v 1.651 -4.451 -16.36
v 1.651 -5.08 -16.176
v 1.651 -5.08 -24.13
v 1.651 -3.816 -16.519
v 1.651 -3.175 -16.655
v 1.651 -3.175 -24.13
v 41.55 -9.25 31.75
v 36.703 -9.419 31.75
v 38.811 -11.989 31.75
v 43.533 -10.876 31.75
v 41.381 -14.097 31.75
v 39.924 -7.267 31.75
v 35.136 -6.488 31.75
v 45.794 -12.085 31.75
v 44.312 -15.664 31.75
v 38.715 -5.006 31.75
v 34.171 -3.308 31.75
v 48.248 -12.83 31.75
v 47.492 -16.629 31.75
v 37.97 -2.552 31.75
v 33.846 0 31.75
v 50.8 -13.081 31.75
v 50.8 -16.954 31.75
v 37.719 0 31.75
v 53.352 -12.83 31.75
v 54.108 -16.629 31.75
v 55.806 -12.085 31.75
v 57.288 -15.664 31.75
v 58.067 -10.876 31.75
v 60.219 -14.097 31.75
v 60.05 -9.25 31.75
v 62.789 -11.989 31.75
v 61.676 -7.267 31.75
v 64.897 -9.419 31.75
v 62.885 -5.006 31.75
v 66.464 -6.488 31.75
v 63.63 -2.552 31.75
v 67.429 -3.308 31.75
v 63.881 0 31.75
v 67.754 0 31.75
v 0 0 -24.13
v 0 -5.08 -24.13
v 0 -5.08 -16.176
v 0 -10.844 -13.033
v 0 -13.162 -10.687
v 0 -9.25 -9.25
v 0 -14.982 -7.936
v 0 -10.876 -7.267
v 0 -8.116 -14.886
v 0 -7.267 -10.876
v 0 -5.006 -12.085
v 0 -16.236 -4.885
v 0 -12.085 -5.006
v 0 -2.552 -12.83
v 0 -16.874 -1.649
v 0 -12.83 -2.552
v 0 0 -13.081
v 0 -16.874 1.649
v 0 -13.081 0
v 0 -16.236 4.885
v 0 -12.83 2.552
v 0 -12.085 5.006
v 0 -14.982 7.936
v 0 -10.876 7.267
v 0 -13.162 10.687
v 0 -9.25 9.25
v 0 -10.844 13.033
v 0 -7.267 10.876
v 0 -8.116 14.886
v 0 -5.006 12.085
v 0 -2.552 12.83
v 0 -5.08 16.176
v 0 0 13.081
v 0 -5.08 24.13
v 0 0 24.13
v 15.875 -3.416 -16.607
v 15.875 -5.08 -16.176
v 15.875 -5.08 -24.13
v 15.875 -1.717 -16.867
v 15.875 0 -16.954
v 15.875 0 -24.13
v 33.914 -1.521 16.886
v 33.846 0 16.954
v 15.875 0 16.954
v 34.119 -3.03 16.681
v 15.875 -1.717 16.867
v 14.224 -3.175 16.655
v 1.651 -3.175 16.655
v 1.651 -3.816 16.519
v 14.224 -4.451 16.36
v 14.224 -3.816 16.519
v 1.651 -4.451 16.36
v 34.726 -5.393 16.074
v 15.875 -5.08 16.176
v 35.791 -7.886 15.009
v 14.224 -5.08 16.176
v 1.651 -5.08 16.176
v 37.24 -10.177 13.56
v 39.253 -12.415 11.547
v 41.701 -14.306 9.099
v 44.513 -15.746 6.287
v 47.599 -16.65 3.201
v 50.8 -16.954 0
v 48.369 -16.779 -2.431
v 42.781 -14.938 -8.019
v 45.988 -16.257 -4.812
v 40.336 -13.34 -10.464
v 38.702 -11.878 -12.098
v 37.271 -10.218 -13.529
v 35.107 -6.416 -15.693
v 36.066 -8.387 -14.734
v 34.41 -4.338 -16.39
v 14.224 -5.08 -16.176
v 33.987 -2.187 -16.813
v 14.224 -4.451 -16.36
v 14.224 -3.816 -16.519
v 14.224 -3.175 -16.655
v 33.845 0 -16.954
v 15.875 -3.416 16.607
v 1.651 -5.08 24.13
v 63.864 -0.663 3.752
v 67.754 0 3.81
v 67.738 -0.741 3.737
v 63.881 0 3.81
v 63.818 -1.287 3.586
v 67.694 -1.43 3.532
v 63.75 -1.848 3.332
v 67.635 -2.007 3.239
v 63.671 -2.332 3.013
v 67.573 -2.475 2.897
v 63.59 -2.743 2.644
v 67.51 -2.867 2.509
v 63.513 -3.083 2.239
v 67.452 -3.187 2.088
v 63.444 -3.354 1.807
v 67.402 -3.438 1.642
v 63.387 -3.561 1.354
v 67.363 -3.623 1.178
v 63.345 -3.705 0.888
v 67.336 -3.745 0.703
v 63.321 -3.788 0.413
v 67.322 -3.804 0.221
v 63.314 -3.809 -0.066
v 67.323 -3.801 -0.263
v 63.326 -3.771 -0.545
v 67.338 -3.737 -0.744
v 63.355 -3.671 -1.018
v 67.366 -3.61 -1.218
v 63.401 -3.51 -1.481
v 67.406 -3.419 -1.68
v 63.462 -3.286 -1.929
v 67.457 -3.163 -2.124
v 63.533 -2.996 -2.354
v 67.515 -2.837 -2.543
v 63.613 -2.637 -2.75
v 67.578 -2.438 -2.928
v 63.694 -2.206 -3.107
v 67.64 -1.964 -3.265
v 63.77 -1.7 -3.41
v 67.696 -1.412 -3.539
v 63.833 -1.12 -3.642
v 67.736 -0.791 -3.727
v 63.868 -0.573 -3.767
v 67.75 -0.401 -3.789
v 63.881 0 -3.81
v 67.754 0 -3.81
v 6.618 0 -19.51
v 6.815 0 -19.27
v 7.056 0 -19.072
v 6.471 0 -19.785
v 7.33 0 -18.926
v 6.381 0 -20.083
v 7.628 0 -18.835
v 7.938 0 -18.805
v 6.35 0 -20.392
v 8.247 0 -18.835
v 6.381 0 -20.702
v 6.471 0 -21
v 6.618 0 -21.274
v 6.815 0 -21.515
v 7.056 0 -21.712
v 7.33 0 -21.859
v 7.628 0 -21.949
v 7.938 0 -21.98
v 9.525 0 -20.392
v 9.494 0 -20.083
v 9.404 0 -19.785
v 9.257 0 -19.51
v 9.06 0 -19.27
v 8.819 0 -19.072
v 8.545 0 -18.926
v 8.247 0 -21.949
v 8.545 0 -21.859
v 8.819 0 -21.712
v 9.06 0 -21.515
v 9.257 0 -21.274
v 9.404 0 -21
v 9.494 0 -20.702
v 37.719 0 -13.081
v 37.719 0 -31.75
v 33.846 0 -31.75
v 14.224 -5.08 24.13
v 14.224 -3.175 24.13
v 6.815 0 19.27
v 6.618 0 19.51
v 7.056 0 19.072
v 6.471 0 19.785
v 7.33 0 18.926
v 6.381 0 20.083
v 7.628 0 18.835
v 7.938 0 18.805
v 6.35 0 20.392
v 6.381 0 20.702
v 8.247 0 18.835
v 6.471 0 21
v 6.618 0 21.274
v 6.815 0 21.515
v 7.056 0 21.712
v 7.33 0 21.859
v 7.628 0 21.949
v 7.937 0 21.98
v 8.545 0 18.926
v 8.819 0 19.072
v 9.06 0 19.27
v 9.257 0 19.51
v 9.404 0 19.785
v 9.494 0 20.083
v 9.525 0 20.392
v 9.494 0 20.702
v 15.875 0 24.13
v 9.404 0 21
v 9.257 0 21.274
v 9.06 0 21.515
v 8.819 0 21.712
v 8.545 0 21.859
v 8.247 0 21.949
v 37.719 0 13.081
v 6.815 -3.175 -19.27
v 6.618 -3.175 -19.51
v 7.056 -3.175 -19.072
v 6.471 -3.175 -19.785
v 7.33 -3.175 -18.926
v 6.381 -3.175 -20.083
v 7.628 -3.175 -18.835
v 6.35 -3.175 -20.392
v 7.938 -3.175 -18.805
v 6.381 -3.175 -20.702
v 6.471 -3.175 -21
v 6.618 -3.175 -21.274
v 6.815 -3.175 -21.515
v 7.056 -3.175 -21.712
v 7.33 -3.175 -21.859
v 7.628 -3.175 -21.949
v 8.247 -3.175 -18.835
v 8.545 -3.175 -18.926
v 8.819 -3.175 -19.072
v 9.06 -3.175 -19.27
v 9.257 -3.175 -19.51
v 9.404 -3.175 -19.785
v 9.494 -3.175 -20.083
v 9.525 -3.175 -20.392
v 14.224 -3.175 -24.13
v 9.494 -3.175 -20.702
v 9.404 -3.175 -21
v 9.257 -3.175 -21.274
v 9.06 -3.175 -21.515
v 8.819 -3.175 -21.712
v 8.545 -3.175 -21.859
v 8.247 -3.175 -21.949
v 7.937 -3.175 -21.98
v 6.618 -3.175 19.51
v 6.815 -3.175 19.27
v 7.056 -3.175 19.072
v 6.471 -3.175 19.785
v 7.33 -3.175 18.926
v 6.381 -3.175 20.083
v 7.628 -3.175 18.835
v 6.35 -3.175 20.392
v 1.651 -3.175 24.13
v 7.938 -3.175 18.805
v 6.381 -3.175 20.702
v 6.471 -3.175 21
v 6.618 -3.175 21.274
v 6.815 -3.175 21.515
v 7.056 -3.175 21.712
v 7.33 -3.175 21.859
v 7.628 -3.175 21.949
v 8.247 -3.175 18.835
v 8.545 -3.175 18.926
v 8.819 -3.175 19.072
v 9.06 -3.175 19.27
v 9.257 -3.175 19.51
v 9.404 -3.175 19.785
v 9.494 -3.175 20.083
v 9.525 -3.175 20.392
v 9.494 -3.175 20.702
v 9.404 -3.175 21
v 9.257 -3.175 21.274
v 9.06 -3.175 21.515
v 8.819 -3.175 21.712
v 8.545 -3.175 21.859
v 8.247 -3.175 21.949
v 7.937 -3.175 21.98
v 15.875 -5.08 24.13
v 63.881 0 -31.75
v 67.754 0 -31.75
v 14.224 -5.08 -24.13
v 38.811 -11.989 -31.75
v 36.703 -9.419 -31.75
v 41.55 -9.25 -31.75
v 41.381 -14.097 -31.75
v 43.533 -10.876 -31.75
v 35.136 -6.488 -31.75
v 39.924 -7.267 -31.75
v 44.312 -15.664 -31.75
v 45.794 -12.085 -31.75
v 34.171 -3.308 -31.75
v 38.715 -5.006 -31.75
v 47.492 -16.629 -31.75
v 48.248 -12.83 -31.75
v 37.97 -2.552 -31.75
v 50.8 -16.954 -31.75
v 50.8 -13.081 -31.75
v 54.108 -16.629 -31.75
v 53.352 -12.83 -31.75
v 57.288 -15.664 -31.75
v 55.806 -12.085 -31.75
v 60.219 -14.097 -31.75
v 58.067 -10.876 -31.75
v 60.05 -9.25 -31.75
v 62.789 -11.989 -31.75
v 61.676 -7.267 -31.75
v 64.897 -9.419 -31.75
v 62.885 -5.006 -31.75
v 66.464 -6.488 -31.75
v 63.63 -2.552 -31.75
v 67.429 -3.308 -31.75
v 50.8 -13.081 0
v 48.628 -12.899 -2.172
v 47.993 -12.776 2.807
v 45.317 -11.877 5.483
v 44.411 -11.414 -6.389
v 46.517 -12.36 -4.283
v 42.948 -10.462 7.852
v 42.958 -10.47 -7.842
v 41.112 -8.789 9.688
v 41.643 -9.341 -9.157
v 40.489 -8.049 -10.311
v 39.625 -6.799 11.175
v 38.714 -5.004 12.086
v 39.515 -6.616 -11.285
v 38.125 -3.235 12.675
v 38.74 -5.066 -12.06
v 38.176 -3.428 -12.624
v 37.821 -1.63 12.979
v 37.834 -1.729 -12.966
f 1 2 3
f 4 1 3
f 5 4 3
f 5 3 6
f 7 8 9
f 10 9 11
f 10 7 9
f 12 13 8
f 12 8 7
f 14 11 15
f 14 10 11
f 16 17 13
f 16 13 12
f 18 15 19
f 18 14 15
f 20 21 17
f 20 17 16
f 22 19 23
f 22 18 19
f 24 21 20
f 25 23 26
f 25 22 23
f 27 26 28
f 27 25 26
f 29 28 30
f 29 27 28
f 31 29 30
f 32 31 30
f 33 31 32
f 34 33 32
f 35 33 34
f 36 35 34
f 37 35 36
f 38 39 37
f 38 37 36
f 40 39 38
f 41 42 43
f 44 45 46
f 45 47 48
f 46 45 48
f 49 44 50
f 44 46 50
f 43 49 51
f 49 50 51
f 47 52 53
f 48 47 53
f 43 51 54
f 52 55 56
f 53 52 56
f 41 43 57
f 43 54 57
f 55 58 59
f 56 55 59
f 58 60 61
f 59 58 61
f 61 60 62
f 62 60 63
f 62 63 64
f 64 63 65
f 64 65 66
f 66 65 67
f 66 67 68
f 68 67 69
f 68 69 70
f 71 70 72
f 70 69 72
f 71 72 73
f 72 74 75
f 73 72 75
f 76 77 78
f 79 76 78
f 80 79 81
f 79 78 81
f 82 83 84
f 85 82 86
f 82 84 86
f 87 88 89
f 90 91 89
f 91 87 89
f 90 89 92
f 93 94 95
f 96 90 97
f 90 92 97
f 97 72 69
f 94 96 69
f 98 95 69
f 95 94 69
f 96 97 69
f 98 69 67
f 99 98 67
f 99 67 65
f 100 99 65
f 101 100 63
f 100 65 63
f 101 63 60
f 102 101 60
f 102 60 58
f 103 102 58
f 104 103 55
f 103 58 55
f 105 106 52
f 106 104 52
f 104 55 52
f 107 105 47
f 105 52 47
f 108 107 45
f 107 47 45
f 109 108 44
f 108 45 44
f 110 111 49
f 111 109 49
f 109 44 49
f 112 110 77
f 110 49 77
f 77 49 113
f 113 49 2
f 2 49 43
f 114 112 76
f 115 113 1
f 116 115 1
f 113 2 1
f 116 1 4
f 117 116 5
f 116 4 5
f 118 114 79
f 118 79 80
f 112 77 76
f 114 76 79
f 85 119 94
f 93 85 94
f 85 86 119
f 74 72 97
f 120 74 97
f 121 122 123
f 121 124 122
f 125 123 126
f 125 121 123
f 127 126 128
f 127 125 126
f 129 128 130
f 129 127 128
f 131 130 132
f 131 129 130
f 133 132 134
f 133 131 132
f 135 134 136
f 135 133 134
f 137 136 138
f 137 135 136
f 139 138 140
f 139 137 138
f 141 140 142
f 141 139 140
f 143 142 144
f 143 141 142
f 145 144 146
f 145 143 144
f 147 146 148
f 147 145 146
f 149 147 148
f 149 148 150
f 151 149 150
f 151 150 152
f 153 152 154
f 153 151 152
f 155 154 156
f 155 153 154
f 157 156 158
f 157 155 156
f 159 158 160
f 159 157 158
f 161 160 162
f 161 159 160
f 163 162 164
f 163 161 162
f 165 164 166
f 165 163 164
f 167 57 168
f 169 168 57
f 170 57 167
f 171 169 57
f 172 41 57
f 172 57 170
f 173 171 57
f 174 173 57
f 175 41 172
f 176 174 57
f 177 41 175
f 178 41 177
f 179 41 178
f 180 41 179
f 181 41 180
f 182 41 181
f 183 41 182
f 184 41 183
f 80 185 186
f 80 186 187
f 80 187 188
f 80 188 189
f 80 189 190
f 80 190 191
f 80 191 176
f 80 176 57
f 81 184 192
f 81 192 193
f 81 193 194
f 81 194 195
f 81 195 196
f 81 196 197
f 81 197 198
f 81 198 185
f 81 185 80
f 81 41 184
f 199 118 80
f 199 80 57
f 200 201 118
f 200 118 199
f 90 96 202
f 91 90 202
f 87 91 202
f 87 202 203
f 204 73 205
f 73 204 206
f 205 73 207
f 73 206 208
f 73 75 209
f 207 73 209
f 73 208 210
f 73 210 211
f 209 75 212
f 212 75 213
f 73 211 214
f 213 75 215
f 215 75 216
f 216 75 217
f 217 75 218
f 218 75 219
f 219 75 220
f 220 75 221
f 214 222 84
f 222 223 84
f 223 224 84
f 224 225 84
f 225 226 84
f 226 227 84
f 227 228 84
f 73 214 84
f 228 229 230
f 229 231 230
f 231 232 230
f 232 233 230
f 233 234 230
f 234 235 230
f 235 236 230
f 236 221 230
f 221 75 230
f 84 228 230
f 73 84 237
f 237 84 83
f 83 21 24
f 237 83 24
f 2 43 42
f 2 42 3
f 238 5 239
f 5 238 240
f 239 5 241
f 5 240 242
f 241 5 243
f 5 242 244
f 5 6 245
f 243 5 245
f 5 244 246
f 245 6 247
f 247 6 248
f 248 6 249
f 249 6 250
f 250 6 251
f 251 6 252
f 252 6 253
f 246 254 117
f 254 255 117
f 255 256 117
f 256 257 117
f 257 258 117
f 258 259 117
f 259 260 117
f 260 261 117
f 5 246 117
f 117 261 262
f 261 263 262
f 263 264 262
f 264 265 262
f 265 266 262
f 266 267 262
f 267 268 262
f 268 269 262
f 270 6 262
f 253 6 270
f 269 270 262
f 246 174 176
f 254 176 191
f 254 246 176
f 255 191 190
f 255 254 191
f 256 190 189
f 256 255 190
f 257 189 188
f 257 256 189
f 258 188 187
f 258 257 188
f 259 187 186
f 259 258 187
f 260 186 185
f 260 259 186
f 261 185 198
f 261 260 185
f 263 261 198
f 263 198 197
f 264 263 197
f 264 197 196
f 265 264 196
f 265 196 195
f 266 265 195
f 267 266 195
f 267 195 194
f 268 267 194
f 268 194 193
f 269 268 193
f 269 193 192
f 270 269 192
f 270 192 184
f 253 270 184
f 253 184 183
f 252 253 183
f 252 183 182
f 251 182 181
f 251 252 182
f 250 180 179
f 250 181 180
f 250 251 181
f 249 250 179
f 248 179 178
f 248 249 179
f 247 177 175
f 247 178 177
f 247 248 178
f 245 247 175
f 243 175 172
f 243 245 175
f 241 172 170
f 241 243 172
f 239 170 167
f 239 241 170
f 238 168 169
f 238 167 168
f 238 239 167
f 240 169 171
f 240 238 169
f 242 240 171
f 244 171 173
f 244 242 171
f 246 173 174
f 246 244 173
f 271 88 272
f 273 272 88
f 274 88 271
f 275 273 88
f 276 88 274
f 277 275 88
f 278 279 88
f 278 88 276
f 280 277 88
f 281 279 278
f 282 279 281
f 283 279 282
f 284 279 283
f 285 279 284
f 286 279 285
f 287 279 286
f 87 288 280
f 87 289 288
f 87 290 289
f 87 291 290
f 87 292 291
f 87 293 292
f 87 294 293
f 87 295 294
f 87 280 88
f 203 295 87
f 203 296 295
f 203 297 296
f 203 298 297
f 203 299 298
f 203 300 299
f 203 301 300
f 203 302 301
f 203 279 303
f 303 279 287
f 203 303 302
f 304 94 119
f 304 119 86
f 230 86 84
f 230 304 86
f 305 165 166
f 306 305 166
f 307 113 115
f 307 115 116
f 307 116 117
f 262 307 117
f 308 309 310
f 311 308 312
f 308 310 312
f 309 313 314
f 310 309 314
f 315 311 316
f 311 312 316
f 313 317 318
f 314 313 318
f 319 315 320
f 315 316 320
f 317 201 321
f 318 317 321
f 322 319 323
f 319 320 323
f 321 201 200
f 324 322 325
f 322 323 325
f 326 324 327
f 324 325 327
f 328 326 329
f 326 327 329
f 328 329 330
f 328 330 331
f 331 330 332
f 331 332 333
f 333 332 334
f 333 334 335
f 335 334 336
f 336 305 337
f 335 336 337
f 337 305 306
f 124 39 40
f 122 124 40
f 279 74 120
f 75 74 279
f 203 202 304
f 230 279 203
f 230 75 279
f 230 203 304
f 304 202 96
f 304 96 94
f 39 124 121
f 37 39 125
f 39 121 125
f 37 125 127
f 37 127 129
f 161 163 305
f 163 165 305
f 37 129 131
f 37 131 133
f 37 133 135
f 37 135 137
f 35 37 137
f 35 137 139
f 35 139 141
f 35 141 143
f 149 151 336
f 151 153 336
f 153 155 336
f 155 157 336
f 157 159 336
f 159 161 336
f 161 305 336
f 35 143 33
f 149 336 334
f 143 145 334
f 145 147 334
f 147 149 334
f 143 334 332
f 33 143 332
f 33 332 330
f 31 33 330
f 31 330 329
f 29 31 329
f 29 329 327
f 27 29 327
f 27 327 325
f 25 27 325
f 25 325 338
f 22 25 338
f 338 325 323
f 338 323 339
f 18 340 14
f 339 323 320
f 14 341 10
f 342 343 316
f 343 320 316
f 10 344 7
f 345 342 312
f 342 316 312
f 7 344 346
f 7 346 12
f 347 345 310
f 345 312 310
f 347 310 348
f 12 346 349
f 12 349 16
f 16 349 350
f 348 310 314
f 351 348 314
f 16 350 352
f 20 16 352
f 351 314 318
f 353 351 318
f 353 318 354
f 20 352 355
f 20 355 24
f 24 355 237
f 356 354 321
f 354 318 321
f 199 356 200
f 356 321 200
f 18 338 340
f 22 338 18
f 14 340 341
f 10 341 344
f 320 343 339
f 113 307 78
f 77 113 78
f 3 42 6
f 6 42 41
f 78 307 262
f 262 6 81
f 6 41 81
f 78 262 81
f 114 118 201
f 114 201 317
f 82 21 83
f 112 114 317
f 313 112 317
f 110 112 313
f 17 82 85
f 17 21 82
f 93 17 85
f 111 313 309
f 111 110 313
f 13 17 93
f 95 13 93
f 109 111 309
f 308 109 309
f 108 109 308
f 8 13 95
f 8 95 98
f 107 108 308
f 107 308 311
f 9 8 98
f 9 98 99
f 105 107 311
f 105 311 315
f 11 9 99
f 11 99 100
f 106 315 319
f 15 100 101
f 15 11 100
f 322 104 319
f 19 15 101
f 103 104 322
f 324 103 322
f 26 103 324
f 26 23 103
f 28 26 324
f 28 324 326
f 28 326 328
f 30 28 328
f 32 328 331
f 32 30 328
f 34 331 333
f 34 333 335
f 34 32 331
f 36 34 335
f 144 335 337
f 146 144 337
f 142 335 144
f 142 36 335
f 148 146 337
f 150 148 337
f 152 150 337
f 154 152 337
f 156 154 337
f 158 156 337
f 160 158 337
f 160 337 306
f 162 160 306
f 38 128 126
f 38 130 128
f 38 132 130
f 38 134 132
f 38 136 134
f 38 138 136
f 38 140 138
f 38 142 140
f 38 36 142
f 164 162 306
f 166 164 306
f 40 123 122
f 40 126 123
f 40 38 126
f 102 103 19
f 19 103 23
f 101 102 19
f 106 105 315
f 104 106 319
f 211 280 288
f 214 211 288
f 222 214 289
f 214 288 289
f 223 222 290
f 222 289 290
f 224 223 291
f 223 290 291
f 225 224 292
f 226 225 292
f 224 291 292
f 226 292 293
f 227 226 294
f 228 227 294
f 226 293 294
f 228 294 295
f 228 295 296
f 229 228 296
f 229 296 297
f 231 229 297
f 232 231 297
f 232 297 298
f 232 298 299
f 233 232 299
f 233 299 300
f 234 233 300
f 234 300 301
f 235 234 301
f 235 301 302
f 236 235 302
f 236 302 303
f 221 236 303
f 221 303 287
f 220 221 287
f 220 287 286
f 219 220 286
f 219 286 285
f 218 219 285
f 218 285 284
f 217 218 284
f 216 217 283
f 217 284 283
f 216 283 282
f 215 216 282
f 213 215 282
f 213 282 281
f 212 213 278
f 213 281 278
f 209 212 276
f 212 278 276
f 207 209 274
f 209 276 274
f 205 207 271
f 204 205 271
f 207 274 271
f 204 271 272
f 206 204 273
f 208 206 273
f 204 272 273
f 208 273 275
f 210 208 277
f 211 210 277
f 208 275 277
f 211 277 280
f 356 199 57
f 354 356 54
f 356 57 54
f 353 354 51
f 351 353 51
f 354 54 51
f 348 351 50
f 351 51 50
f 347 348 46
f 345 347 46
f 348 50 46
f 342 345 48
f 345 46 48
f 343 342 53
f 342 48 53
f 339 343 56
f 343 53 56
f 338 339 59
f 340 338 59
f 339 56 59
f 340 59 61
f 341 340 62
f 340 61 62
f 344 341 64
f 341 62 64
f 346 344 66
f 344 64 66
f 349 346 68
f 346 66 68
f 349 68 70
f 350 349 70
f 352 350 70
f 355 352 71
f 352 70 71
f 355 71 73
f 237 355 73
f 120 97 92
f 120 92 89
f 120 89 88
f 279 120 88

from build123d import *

# Parameters (mm, degrees)
SKETCH1_R                = 16.9545
BOSS_EXTRUDE1_DEPTH      = 50.8
SKETCH2_R                = 16.9545
BOSS_EXTRUDE2_DEPTH      = 31.75
SKETCH3_R                = 13.081
CUT_EXTRUDE1_DEPTH       = 50.8
SKETCH5_R                = 13.081
CUT_EXTRUDE2_DEPTH       = 63.5
CUT_EXTRUDE4_DEPTH       = 77.72150833
CUT_EXTRUDE4_DEPTH_BACK  = 77.72150833
SKETCH6_R                = 3.81
BOSS_EXTRUDE3_REACH      = 91.447
BOSS_EXTRUDE3_END_RADIUS = 16.9545
SKETCH8_W                = 15.875
SKETCH8_H                = 5.08
CUT_EXTRUDE5_REACH       = 91.447
CUT_EXTRUDE5_END_RADIUS  = 16.9545
SKETCH9_W                = 12.573
SKETCH9_H                = 1.905
SKETCH10_R               = 1.5875
CUT_EXTRUDE6_DEPTH       = 77.08291144


with BuildPart() as part:
    # Sketch1 → Boss-Extrude1 (new body)
    with BuildSketch(Plane(origin=(0, 0, 0), x_dir=(0, 0, -1), z_dir=(1, 0, 0))):
        Circle(SKETCH1_R)
    extrude(amount=BOSS_EXTRUDE1_DEPTH)

    # Sketch2 → Boss-Extrude2 (add, symmetric)
    with BuildSketch(Plane.XY):
        with Locations((50.8, 0)):
            Circle(SKETCH2_R)
    extrude(amount=BOSS_EXTRUDE2_DEPTH, both=True)

    # Sketch3 → Cut-Extrude1 (cut)
    with BuildSketch(Plane.ZY):
        Circle(SKETCH3_R)
    extrude(amount=-CUT_EXTRUDE1_DEPTH, mode=Mode.SUBTRACT)

    # Sketch5 → Cut-Extrude2 (cut)
    with BuildSketch(Plane(origin=(0, 0, -31.75), x_dir=(-1, 0, 0), z_dir=(0, 0, -1))):
        with Locations((-50.8, 0)):
            Circle(SKETCH5_R)
    extrude(amount=-CUT_EXTRUDE2_DEPTH, mode=Mode.SUBTRACT)

    # Sketch6 → Cut-Extrude4 (cut, two sides: drawn at the far end of the back side and taken through both)
    with BuildSketch(Plane(origin=(0, 0, 0), x_dir=(0, 0, -1), z_dir=(1, 0, 0)).offset(-CUT_EXTRUDE4_DEPTH_BACK)):
        with Locations(Location((0, 0, 0), (0, 0, 180))):
            Circle(SKETCH6_R)
    extrude(amount=CUT_EXTRUDE4_DEPTH + CUT_EXTRUDE4_DEPTH_BACK, mode=Mode.SUBTRACT)

    # SurfaceCut1
    split(bisect_by=Plane(origin=(0, 0, 0), x_dir=(1, 0, 0), z_dir=(0, 1, 0)), keep=Keep.BOTTOM)


with BuildPart() as body_2:
    # Boss-Extrude3: up to this cylinder (the profile starts outside it)
    boss_extrude3_end = Plane(origin=(7.9375, 0, 0), z_dir=(-1, 0, 0)) * Cylinder(BOSS_EXTRUDE3_END_RADIUS, 217.803, mode=Mode.PRIVATE)
    # Sketch8 → Boss-Extrude3 (new, up to the surface)
    with BuildSketch(Plane.XY.offset(24.13), mode=Mode.PRIVATE) as boss_extrude3_sk1:
        with Locations((7.9375, -2.54)):
            Rectangle(SKETCH8_W, SKETCH8_H)
    boss_extrude3_tool1 = extrude(boss_extrude3_sk1.sketch, amount=-BOSS_EXTRUDE3_REACH, mode=Mode.PRIVATE) - boss_extrude3_end
    add(boss_extrude3_tool1.solids().sort_by_distance((7.9375, -2.54, 24.13))[0])

    # Cut-Extrude5: up to this cylinder (the profile starts outside it)
    cut_extrude5_end = Plane(origin=(7.9375, 0, 0), z_dir=(-1, 0, 0)) * Cylinder(CUT_EXTRUDE5_END_RADIUS, 217.803, mode=Mode.PRIVATE)
    # Sketch9 → Cut-Extrude5 (cut, up to the surface)
    with BuildSketch(Plane.XY.offset(24.13), mode=Mode.PRIVATE) as cut_extrude5_sk1:
        with Locations((7.9375, -4.1275)):
            Rectangle(SKETCH9_W, SKETCH9_H)
    cut_extrude5_tool1 = extrude(cut_extrude5_sk1.sketch, amount=-CUT_EXTRUDE5_REACH, mode=Mode.PRIVATE) - cut_extrude5_end
    add(cut_extrude5_tool1.solids().sort_by_distance((7.9375, -4.1275, 24.13))[0], mode=Mode.SUBTRACT)


with BuildPart() as body_3:
    # Mirror1: mirrored copy
    add(body_2.part.mirror(Plane.XY))


with BuildPart() as part_1:
    add(part.part)

    # Intersect1: read off the stored shape, not the designer's step
    # Intersect1: union body 3, body 2
    add(body_3.part)
    add(body_2.part)

    # Sketch10 → Cut-Extrude6 (cut, through all)
    with BuildSketch(Plane.XZ.offset(3.175)):
        with Locations(Location((7.9375, 20.392281148, 0), (0, 0, 270))):
            Circle(SKETCH10_R)
    cut_extrude6 = extrude(amount=-CUT_EXTRUDE6_DEPTH, mode=Mode.SUBTRACT)

    # Mirror2: Cut-Extrude6 across plane
    add(cut_extrude6.mirror(Plane.XY), mode=Mode.SUBTRACT)


solid = part_1.part
